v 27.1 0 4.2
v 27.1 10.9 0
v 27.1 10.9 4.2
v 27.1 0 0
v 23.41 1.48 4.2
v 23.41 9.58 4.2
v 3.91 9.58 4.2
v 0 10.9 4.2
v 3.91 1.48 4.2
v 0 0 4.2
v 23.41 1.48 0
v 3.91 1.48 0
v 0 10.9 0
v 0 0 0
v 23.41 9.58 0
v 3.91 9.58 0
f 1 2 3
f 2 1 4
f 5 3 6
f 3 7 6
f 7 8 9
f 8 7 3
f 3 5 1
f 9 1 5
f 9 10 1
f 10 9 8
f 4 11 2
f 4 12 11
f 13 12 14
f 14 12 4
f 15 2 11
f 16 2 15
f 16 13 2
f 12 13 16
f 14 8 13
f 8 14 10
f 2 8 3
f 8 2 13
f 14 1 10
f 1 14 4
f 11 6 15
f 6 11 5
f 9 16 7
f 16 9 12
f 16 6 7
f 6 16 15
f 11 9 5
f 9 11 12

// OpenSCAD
difference(){
    cube([27.1, 10.9, 4.2]);
    translate([3.91, 1.48, -0.1]){
        cube([19.5, 8.1, 5]);
    }
}
